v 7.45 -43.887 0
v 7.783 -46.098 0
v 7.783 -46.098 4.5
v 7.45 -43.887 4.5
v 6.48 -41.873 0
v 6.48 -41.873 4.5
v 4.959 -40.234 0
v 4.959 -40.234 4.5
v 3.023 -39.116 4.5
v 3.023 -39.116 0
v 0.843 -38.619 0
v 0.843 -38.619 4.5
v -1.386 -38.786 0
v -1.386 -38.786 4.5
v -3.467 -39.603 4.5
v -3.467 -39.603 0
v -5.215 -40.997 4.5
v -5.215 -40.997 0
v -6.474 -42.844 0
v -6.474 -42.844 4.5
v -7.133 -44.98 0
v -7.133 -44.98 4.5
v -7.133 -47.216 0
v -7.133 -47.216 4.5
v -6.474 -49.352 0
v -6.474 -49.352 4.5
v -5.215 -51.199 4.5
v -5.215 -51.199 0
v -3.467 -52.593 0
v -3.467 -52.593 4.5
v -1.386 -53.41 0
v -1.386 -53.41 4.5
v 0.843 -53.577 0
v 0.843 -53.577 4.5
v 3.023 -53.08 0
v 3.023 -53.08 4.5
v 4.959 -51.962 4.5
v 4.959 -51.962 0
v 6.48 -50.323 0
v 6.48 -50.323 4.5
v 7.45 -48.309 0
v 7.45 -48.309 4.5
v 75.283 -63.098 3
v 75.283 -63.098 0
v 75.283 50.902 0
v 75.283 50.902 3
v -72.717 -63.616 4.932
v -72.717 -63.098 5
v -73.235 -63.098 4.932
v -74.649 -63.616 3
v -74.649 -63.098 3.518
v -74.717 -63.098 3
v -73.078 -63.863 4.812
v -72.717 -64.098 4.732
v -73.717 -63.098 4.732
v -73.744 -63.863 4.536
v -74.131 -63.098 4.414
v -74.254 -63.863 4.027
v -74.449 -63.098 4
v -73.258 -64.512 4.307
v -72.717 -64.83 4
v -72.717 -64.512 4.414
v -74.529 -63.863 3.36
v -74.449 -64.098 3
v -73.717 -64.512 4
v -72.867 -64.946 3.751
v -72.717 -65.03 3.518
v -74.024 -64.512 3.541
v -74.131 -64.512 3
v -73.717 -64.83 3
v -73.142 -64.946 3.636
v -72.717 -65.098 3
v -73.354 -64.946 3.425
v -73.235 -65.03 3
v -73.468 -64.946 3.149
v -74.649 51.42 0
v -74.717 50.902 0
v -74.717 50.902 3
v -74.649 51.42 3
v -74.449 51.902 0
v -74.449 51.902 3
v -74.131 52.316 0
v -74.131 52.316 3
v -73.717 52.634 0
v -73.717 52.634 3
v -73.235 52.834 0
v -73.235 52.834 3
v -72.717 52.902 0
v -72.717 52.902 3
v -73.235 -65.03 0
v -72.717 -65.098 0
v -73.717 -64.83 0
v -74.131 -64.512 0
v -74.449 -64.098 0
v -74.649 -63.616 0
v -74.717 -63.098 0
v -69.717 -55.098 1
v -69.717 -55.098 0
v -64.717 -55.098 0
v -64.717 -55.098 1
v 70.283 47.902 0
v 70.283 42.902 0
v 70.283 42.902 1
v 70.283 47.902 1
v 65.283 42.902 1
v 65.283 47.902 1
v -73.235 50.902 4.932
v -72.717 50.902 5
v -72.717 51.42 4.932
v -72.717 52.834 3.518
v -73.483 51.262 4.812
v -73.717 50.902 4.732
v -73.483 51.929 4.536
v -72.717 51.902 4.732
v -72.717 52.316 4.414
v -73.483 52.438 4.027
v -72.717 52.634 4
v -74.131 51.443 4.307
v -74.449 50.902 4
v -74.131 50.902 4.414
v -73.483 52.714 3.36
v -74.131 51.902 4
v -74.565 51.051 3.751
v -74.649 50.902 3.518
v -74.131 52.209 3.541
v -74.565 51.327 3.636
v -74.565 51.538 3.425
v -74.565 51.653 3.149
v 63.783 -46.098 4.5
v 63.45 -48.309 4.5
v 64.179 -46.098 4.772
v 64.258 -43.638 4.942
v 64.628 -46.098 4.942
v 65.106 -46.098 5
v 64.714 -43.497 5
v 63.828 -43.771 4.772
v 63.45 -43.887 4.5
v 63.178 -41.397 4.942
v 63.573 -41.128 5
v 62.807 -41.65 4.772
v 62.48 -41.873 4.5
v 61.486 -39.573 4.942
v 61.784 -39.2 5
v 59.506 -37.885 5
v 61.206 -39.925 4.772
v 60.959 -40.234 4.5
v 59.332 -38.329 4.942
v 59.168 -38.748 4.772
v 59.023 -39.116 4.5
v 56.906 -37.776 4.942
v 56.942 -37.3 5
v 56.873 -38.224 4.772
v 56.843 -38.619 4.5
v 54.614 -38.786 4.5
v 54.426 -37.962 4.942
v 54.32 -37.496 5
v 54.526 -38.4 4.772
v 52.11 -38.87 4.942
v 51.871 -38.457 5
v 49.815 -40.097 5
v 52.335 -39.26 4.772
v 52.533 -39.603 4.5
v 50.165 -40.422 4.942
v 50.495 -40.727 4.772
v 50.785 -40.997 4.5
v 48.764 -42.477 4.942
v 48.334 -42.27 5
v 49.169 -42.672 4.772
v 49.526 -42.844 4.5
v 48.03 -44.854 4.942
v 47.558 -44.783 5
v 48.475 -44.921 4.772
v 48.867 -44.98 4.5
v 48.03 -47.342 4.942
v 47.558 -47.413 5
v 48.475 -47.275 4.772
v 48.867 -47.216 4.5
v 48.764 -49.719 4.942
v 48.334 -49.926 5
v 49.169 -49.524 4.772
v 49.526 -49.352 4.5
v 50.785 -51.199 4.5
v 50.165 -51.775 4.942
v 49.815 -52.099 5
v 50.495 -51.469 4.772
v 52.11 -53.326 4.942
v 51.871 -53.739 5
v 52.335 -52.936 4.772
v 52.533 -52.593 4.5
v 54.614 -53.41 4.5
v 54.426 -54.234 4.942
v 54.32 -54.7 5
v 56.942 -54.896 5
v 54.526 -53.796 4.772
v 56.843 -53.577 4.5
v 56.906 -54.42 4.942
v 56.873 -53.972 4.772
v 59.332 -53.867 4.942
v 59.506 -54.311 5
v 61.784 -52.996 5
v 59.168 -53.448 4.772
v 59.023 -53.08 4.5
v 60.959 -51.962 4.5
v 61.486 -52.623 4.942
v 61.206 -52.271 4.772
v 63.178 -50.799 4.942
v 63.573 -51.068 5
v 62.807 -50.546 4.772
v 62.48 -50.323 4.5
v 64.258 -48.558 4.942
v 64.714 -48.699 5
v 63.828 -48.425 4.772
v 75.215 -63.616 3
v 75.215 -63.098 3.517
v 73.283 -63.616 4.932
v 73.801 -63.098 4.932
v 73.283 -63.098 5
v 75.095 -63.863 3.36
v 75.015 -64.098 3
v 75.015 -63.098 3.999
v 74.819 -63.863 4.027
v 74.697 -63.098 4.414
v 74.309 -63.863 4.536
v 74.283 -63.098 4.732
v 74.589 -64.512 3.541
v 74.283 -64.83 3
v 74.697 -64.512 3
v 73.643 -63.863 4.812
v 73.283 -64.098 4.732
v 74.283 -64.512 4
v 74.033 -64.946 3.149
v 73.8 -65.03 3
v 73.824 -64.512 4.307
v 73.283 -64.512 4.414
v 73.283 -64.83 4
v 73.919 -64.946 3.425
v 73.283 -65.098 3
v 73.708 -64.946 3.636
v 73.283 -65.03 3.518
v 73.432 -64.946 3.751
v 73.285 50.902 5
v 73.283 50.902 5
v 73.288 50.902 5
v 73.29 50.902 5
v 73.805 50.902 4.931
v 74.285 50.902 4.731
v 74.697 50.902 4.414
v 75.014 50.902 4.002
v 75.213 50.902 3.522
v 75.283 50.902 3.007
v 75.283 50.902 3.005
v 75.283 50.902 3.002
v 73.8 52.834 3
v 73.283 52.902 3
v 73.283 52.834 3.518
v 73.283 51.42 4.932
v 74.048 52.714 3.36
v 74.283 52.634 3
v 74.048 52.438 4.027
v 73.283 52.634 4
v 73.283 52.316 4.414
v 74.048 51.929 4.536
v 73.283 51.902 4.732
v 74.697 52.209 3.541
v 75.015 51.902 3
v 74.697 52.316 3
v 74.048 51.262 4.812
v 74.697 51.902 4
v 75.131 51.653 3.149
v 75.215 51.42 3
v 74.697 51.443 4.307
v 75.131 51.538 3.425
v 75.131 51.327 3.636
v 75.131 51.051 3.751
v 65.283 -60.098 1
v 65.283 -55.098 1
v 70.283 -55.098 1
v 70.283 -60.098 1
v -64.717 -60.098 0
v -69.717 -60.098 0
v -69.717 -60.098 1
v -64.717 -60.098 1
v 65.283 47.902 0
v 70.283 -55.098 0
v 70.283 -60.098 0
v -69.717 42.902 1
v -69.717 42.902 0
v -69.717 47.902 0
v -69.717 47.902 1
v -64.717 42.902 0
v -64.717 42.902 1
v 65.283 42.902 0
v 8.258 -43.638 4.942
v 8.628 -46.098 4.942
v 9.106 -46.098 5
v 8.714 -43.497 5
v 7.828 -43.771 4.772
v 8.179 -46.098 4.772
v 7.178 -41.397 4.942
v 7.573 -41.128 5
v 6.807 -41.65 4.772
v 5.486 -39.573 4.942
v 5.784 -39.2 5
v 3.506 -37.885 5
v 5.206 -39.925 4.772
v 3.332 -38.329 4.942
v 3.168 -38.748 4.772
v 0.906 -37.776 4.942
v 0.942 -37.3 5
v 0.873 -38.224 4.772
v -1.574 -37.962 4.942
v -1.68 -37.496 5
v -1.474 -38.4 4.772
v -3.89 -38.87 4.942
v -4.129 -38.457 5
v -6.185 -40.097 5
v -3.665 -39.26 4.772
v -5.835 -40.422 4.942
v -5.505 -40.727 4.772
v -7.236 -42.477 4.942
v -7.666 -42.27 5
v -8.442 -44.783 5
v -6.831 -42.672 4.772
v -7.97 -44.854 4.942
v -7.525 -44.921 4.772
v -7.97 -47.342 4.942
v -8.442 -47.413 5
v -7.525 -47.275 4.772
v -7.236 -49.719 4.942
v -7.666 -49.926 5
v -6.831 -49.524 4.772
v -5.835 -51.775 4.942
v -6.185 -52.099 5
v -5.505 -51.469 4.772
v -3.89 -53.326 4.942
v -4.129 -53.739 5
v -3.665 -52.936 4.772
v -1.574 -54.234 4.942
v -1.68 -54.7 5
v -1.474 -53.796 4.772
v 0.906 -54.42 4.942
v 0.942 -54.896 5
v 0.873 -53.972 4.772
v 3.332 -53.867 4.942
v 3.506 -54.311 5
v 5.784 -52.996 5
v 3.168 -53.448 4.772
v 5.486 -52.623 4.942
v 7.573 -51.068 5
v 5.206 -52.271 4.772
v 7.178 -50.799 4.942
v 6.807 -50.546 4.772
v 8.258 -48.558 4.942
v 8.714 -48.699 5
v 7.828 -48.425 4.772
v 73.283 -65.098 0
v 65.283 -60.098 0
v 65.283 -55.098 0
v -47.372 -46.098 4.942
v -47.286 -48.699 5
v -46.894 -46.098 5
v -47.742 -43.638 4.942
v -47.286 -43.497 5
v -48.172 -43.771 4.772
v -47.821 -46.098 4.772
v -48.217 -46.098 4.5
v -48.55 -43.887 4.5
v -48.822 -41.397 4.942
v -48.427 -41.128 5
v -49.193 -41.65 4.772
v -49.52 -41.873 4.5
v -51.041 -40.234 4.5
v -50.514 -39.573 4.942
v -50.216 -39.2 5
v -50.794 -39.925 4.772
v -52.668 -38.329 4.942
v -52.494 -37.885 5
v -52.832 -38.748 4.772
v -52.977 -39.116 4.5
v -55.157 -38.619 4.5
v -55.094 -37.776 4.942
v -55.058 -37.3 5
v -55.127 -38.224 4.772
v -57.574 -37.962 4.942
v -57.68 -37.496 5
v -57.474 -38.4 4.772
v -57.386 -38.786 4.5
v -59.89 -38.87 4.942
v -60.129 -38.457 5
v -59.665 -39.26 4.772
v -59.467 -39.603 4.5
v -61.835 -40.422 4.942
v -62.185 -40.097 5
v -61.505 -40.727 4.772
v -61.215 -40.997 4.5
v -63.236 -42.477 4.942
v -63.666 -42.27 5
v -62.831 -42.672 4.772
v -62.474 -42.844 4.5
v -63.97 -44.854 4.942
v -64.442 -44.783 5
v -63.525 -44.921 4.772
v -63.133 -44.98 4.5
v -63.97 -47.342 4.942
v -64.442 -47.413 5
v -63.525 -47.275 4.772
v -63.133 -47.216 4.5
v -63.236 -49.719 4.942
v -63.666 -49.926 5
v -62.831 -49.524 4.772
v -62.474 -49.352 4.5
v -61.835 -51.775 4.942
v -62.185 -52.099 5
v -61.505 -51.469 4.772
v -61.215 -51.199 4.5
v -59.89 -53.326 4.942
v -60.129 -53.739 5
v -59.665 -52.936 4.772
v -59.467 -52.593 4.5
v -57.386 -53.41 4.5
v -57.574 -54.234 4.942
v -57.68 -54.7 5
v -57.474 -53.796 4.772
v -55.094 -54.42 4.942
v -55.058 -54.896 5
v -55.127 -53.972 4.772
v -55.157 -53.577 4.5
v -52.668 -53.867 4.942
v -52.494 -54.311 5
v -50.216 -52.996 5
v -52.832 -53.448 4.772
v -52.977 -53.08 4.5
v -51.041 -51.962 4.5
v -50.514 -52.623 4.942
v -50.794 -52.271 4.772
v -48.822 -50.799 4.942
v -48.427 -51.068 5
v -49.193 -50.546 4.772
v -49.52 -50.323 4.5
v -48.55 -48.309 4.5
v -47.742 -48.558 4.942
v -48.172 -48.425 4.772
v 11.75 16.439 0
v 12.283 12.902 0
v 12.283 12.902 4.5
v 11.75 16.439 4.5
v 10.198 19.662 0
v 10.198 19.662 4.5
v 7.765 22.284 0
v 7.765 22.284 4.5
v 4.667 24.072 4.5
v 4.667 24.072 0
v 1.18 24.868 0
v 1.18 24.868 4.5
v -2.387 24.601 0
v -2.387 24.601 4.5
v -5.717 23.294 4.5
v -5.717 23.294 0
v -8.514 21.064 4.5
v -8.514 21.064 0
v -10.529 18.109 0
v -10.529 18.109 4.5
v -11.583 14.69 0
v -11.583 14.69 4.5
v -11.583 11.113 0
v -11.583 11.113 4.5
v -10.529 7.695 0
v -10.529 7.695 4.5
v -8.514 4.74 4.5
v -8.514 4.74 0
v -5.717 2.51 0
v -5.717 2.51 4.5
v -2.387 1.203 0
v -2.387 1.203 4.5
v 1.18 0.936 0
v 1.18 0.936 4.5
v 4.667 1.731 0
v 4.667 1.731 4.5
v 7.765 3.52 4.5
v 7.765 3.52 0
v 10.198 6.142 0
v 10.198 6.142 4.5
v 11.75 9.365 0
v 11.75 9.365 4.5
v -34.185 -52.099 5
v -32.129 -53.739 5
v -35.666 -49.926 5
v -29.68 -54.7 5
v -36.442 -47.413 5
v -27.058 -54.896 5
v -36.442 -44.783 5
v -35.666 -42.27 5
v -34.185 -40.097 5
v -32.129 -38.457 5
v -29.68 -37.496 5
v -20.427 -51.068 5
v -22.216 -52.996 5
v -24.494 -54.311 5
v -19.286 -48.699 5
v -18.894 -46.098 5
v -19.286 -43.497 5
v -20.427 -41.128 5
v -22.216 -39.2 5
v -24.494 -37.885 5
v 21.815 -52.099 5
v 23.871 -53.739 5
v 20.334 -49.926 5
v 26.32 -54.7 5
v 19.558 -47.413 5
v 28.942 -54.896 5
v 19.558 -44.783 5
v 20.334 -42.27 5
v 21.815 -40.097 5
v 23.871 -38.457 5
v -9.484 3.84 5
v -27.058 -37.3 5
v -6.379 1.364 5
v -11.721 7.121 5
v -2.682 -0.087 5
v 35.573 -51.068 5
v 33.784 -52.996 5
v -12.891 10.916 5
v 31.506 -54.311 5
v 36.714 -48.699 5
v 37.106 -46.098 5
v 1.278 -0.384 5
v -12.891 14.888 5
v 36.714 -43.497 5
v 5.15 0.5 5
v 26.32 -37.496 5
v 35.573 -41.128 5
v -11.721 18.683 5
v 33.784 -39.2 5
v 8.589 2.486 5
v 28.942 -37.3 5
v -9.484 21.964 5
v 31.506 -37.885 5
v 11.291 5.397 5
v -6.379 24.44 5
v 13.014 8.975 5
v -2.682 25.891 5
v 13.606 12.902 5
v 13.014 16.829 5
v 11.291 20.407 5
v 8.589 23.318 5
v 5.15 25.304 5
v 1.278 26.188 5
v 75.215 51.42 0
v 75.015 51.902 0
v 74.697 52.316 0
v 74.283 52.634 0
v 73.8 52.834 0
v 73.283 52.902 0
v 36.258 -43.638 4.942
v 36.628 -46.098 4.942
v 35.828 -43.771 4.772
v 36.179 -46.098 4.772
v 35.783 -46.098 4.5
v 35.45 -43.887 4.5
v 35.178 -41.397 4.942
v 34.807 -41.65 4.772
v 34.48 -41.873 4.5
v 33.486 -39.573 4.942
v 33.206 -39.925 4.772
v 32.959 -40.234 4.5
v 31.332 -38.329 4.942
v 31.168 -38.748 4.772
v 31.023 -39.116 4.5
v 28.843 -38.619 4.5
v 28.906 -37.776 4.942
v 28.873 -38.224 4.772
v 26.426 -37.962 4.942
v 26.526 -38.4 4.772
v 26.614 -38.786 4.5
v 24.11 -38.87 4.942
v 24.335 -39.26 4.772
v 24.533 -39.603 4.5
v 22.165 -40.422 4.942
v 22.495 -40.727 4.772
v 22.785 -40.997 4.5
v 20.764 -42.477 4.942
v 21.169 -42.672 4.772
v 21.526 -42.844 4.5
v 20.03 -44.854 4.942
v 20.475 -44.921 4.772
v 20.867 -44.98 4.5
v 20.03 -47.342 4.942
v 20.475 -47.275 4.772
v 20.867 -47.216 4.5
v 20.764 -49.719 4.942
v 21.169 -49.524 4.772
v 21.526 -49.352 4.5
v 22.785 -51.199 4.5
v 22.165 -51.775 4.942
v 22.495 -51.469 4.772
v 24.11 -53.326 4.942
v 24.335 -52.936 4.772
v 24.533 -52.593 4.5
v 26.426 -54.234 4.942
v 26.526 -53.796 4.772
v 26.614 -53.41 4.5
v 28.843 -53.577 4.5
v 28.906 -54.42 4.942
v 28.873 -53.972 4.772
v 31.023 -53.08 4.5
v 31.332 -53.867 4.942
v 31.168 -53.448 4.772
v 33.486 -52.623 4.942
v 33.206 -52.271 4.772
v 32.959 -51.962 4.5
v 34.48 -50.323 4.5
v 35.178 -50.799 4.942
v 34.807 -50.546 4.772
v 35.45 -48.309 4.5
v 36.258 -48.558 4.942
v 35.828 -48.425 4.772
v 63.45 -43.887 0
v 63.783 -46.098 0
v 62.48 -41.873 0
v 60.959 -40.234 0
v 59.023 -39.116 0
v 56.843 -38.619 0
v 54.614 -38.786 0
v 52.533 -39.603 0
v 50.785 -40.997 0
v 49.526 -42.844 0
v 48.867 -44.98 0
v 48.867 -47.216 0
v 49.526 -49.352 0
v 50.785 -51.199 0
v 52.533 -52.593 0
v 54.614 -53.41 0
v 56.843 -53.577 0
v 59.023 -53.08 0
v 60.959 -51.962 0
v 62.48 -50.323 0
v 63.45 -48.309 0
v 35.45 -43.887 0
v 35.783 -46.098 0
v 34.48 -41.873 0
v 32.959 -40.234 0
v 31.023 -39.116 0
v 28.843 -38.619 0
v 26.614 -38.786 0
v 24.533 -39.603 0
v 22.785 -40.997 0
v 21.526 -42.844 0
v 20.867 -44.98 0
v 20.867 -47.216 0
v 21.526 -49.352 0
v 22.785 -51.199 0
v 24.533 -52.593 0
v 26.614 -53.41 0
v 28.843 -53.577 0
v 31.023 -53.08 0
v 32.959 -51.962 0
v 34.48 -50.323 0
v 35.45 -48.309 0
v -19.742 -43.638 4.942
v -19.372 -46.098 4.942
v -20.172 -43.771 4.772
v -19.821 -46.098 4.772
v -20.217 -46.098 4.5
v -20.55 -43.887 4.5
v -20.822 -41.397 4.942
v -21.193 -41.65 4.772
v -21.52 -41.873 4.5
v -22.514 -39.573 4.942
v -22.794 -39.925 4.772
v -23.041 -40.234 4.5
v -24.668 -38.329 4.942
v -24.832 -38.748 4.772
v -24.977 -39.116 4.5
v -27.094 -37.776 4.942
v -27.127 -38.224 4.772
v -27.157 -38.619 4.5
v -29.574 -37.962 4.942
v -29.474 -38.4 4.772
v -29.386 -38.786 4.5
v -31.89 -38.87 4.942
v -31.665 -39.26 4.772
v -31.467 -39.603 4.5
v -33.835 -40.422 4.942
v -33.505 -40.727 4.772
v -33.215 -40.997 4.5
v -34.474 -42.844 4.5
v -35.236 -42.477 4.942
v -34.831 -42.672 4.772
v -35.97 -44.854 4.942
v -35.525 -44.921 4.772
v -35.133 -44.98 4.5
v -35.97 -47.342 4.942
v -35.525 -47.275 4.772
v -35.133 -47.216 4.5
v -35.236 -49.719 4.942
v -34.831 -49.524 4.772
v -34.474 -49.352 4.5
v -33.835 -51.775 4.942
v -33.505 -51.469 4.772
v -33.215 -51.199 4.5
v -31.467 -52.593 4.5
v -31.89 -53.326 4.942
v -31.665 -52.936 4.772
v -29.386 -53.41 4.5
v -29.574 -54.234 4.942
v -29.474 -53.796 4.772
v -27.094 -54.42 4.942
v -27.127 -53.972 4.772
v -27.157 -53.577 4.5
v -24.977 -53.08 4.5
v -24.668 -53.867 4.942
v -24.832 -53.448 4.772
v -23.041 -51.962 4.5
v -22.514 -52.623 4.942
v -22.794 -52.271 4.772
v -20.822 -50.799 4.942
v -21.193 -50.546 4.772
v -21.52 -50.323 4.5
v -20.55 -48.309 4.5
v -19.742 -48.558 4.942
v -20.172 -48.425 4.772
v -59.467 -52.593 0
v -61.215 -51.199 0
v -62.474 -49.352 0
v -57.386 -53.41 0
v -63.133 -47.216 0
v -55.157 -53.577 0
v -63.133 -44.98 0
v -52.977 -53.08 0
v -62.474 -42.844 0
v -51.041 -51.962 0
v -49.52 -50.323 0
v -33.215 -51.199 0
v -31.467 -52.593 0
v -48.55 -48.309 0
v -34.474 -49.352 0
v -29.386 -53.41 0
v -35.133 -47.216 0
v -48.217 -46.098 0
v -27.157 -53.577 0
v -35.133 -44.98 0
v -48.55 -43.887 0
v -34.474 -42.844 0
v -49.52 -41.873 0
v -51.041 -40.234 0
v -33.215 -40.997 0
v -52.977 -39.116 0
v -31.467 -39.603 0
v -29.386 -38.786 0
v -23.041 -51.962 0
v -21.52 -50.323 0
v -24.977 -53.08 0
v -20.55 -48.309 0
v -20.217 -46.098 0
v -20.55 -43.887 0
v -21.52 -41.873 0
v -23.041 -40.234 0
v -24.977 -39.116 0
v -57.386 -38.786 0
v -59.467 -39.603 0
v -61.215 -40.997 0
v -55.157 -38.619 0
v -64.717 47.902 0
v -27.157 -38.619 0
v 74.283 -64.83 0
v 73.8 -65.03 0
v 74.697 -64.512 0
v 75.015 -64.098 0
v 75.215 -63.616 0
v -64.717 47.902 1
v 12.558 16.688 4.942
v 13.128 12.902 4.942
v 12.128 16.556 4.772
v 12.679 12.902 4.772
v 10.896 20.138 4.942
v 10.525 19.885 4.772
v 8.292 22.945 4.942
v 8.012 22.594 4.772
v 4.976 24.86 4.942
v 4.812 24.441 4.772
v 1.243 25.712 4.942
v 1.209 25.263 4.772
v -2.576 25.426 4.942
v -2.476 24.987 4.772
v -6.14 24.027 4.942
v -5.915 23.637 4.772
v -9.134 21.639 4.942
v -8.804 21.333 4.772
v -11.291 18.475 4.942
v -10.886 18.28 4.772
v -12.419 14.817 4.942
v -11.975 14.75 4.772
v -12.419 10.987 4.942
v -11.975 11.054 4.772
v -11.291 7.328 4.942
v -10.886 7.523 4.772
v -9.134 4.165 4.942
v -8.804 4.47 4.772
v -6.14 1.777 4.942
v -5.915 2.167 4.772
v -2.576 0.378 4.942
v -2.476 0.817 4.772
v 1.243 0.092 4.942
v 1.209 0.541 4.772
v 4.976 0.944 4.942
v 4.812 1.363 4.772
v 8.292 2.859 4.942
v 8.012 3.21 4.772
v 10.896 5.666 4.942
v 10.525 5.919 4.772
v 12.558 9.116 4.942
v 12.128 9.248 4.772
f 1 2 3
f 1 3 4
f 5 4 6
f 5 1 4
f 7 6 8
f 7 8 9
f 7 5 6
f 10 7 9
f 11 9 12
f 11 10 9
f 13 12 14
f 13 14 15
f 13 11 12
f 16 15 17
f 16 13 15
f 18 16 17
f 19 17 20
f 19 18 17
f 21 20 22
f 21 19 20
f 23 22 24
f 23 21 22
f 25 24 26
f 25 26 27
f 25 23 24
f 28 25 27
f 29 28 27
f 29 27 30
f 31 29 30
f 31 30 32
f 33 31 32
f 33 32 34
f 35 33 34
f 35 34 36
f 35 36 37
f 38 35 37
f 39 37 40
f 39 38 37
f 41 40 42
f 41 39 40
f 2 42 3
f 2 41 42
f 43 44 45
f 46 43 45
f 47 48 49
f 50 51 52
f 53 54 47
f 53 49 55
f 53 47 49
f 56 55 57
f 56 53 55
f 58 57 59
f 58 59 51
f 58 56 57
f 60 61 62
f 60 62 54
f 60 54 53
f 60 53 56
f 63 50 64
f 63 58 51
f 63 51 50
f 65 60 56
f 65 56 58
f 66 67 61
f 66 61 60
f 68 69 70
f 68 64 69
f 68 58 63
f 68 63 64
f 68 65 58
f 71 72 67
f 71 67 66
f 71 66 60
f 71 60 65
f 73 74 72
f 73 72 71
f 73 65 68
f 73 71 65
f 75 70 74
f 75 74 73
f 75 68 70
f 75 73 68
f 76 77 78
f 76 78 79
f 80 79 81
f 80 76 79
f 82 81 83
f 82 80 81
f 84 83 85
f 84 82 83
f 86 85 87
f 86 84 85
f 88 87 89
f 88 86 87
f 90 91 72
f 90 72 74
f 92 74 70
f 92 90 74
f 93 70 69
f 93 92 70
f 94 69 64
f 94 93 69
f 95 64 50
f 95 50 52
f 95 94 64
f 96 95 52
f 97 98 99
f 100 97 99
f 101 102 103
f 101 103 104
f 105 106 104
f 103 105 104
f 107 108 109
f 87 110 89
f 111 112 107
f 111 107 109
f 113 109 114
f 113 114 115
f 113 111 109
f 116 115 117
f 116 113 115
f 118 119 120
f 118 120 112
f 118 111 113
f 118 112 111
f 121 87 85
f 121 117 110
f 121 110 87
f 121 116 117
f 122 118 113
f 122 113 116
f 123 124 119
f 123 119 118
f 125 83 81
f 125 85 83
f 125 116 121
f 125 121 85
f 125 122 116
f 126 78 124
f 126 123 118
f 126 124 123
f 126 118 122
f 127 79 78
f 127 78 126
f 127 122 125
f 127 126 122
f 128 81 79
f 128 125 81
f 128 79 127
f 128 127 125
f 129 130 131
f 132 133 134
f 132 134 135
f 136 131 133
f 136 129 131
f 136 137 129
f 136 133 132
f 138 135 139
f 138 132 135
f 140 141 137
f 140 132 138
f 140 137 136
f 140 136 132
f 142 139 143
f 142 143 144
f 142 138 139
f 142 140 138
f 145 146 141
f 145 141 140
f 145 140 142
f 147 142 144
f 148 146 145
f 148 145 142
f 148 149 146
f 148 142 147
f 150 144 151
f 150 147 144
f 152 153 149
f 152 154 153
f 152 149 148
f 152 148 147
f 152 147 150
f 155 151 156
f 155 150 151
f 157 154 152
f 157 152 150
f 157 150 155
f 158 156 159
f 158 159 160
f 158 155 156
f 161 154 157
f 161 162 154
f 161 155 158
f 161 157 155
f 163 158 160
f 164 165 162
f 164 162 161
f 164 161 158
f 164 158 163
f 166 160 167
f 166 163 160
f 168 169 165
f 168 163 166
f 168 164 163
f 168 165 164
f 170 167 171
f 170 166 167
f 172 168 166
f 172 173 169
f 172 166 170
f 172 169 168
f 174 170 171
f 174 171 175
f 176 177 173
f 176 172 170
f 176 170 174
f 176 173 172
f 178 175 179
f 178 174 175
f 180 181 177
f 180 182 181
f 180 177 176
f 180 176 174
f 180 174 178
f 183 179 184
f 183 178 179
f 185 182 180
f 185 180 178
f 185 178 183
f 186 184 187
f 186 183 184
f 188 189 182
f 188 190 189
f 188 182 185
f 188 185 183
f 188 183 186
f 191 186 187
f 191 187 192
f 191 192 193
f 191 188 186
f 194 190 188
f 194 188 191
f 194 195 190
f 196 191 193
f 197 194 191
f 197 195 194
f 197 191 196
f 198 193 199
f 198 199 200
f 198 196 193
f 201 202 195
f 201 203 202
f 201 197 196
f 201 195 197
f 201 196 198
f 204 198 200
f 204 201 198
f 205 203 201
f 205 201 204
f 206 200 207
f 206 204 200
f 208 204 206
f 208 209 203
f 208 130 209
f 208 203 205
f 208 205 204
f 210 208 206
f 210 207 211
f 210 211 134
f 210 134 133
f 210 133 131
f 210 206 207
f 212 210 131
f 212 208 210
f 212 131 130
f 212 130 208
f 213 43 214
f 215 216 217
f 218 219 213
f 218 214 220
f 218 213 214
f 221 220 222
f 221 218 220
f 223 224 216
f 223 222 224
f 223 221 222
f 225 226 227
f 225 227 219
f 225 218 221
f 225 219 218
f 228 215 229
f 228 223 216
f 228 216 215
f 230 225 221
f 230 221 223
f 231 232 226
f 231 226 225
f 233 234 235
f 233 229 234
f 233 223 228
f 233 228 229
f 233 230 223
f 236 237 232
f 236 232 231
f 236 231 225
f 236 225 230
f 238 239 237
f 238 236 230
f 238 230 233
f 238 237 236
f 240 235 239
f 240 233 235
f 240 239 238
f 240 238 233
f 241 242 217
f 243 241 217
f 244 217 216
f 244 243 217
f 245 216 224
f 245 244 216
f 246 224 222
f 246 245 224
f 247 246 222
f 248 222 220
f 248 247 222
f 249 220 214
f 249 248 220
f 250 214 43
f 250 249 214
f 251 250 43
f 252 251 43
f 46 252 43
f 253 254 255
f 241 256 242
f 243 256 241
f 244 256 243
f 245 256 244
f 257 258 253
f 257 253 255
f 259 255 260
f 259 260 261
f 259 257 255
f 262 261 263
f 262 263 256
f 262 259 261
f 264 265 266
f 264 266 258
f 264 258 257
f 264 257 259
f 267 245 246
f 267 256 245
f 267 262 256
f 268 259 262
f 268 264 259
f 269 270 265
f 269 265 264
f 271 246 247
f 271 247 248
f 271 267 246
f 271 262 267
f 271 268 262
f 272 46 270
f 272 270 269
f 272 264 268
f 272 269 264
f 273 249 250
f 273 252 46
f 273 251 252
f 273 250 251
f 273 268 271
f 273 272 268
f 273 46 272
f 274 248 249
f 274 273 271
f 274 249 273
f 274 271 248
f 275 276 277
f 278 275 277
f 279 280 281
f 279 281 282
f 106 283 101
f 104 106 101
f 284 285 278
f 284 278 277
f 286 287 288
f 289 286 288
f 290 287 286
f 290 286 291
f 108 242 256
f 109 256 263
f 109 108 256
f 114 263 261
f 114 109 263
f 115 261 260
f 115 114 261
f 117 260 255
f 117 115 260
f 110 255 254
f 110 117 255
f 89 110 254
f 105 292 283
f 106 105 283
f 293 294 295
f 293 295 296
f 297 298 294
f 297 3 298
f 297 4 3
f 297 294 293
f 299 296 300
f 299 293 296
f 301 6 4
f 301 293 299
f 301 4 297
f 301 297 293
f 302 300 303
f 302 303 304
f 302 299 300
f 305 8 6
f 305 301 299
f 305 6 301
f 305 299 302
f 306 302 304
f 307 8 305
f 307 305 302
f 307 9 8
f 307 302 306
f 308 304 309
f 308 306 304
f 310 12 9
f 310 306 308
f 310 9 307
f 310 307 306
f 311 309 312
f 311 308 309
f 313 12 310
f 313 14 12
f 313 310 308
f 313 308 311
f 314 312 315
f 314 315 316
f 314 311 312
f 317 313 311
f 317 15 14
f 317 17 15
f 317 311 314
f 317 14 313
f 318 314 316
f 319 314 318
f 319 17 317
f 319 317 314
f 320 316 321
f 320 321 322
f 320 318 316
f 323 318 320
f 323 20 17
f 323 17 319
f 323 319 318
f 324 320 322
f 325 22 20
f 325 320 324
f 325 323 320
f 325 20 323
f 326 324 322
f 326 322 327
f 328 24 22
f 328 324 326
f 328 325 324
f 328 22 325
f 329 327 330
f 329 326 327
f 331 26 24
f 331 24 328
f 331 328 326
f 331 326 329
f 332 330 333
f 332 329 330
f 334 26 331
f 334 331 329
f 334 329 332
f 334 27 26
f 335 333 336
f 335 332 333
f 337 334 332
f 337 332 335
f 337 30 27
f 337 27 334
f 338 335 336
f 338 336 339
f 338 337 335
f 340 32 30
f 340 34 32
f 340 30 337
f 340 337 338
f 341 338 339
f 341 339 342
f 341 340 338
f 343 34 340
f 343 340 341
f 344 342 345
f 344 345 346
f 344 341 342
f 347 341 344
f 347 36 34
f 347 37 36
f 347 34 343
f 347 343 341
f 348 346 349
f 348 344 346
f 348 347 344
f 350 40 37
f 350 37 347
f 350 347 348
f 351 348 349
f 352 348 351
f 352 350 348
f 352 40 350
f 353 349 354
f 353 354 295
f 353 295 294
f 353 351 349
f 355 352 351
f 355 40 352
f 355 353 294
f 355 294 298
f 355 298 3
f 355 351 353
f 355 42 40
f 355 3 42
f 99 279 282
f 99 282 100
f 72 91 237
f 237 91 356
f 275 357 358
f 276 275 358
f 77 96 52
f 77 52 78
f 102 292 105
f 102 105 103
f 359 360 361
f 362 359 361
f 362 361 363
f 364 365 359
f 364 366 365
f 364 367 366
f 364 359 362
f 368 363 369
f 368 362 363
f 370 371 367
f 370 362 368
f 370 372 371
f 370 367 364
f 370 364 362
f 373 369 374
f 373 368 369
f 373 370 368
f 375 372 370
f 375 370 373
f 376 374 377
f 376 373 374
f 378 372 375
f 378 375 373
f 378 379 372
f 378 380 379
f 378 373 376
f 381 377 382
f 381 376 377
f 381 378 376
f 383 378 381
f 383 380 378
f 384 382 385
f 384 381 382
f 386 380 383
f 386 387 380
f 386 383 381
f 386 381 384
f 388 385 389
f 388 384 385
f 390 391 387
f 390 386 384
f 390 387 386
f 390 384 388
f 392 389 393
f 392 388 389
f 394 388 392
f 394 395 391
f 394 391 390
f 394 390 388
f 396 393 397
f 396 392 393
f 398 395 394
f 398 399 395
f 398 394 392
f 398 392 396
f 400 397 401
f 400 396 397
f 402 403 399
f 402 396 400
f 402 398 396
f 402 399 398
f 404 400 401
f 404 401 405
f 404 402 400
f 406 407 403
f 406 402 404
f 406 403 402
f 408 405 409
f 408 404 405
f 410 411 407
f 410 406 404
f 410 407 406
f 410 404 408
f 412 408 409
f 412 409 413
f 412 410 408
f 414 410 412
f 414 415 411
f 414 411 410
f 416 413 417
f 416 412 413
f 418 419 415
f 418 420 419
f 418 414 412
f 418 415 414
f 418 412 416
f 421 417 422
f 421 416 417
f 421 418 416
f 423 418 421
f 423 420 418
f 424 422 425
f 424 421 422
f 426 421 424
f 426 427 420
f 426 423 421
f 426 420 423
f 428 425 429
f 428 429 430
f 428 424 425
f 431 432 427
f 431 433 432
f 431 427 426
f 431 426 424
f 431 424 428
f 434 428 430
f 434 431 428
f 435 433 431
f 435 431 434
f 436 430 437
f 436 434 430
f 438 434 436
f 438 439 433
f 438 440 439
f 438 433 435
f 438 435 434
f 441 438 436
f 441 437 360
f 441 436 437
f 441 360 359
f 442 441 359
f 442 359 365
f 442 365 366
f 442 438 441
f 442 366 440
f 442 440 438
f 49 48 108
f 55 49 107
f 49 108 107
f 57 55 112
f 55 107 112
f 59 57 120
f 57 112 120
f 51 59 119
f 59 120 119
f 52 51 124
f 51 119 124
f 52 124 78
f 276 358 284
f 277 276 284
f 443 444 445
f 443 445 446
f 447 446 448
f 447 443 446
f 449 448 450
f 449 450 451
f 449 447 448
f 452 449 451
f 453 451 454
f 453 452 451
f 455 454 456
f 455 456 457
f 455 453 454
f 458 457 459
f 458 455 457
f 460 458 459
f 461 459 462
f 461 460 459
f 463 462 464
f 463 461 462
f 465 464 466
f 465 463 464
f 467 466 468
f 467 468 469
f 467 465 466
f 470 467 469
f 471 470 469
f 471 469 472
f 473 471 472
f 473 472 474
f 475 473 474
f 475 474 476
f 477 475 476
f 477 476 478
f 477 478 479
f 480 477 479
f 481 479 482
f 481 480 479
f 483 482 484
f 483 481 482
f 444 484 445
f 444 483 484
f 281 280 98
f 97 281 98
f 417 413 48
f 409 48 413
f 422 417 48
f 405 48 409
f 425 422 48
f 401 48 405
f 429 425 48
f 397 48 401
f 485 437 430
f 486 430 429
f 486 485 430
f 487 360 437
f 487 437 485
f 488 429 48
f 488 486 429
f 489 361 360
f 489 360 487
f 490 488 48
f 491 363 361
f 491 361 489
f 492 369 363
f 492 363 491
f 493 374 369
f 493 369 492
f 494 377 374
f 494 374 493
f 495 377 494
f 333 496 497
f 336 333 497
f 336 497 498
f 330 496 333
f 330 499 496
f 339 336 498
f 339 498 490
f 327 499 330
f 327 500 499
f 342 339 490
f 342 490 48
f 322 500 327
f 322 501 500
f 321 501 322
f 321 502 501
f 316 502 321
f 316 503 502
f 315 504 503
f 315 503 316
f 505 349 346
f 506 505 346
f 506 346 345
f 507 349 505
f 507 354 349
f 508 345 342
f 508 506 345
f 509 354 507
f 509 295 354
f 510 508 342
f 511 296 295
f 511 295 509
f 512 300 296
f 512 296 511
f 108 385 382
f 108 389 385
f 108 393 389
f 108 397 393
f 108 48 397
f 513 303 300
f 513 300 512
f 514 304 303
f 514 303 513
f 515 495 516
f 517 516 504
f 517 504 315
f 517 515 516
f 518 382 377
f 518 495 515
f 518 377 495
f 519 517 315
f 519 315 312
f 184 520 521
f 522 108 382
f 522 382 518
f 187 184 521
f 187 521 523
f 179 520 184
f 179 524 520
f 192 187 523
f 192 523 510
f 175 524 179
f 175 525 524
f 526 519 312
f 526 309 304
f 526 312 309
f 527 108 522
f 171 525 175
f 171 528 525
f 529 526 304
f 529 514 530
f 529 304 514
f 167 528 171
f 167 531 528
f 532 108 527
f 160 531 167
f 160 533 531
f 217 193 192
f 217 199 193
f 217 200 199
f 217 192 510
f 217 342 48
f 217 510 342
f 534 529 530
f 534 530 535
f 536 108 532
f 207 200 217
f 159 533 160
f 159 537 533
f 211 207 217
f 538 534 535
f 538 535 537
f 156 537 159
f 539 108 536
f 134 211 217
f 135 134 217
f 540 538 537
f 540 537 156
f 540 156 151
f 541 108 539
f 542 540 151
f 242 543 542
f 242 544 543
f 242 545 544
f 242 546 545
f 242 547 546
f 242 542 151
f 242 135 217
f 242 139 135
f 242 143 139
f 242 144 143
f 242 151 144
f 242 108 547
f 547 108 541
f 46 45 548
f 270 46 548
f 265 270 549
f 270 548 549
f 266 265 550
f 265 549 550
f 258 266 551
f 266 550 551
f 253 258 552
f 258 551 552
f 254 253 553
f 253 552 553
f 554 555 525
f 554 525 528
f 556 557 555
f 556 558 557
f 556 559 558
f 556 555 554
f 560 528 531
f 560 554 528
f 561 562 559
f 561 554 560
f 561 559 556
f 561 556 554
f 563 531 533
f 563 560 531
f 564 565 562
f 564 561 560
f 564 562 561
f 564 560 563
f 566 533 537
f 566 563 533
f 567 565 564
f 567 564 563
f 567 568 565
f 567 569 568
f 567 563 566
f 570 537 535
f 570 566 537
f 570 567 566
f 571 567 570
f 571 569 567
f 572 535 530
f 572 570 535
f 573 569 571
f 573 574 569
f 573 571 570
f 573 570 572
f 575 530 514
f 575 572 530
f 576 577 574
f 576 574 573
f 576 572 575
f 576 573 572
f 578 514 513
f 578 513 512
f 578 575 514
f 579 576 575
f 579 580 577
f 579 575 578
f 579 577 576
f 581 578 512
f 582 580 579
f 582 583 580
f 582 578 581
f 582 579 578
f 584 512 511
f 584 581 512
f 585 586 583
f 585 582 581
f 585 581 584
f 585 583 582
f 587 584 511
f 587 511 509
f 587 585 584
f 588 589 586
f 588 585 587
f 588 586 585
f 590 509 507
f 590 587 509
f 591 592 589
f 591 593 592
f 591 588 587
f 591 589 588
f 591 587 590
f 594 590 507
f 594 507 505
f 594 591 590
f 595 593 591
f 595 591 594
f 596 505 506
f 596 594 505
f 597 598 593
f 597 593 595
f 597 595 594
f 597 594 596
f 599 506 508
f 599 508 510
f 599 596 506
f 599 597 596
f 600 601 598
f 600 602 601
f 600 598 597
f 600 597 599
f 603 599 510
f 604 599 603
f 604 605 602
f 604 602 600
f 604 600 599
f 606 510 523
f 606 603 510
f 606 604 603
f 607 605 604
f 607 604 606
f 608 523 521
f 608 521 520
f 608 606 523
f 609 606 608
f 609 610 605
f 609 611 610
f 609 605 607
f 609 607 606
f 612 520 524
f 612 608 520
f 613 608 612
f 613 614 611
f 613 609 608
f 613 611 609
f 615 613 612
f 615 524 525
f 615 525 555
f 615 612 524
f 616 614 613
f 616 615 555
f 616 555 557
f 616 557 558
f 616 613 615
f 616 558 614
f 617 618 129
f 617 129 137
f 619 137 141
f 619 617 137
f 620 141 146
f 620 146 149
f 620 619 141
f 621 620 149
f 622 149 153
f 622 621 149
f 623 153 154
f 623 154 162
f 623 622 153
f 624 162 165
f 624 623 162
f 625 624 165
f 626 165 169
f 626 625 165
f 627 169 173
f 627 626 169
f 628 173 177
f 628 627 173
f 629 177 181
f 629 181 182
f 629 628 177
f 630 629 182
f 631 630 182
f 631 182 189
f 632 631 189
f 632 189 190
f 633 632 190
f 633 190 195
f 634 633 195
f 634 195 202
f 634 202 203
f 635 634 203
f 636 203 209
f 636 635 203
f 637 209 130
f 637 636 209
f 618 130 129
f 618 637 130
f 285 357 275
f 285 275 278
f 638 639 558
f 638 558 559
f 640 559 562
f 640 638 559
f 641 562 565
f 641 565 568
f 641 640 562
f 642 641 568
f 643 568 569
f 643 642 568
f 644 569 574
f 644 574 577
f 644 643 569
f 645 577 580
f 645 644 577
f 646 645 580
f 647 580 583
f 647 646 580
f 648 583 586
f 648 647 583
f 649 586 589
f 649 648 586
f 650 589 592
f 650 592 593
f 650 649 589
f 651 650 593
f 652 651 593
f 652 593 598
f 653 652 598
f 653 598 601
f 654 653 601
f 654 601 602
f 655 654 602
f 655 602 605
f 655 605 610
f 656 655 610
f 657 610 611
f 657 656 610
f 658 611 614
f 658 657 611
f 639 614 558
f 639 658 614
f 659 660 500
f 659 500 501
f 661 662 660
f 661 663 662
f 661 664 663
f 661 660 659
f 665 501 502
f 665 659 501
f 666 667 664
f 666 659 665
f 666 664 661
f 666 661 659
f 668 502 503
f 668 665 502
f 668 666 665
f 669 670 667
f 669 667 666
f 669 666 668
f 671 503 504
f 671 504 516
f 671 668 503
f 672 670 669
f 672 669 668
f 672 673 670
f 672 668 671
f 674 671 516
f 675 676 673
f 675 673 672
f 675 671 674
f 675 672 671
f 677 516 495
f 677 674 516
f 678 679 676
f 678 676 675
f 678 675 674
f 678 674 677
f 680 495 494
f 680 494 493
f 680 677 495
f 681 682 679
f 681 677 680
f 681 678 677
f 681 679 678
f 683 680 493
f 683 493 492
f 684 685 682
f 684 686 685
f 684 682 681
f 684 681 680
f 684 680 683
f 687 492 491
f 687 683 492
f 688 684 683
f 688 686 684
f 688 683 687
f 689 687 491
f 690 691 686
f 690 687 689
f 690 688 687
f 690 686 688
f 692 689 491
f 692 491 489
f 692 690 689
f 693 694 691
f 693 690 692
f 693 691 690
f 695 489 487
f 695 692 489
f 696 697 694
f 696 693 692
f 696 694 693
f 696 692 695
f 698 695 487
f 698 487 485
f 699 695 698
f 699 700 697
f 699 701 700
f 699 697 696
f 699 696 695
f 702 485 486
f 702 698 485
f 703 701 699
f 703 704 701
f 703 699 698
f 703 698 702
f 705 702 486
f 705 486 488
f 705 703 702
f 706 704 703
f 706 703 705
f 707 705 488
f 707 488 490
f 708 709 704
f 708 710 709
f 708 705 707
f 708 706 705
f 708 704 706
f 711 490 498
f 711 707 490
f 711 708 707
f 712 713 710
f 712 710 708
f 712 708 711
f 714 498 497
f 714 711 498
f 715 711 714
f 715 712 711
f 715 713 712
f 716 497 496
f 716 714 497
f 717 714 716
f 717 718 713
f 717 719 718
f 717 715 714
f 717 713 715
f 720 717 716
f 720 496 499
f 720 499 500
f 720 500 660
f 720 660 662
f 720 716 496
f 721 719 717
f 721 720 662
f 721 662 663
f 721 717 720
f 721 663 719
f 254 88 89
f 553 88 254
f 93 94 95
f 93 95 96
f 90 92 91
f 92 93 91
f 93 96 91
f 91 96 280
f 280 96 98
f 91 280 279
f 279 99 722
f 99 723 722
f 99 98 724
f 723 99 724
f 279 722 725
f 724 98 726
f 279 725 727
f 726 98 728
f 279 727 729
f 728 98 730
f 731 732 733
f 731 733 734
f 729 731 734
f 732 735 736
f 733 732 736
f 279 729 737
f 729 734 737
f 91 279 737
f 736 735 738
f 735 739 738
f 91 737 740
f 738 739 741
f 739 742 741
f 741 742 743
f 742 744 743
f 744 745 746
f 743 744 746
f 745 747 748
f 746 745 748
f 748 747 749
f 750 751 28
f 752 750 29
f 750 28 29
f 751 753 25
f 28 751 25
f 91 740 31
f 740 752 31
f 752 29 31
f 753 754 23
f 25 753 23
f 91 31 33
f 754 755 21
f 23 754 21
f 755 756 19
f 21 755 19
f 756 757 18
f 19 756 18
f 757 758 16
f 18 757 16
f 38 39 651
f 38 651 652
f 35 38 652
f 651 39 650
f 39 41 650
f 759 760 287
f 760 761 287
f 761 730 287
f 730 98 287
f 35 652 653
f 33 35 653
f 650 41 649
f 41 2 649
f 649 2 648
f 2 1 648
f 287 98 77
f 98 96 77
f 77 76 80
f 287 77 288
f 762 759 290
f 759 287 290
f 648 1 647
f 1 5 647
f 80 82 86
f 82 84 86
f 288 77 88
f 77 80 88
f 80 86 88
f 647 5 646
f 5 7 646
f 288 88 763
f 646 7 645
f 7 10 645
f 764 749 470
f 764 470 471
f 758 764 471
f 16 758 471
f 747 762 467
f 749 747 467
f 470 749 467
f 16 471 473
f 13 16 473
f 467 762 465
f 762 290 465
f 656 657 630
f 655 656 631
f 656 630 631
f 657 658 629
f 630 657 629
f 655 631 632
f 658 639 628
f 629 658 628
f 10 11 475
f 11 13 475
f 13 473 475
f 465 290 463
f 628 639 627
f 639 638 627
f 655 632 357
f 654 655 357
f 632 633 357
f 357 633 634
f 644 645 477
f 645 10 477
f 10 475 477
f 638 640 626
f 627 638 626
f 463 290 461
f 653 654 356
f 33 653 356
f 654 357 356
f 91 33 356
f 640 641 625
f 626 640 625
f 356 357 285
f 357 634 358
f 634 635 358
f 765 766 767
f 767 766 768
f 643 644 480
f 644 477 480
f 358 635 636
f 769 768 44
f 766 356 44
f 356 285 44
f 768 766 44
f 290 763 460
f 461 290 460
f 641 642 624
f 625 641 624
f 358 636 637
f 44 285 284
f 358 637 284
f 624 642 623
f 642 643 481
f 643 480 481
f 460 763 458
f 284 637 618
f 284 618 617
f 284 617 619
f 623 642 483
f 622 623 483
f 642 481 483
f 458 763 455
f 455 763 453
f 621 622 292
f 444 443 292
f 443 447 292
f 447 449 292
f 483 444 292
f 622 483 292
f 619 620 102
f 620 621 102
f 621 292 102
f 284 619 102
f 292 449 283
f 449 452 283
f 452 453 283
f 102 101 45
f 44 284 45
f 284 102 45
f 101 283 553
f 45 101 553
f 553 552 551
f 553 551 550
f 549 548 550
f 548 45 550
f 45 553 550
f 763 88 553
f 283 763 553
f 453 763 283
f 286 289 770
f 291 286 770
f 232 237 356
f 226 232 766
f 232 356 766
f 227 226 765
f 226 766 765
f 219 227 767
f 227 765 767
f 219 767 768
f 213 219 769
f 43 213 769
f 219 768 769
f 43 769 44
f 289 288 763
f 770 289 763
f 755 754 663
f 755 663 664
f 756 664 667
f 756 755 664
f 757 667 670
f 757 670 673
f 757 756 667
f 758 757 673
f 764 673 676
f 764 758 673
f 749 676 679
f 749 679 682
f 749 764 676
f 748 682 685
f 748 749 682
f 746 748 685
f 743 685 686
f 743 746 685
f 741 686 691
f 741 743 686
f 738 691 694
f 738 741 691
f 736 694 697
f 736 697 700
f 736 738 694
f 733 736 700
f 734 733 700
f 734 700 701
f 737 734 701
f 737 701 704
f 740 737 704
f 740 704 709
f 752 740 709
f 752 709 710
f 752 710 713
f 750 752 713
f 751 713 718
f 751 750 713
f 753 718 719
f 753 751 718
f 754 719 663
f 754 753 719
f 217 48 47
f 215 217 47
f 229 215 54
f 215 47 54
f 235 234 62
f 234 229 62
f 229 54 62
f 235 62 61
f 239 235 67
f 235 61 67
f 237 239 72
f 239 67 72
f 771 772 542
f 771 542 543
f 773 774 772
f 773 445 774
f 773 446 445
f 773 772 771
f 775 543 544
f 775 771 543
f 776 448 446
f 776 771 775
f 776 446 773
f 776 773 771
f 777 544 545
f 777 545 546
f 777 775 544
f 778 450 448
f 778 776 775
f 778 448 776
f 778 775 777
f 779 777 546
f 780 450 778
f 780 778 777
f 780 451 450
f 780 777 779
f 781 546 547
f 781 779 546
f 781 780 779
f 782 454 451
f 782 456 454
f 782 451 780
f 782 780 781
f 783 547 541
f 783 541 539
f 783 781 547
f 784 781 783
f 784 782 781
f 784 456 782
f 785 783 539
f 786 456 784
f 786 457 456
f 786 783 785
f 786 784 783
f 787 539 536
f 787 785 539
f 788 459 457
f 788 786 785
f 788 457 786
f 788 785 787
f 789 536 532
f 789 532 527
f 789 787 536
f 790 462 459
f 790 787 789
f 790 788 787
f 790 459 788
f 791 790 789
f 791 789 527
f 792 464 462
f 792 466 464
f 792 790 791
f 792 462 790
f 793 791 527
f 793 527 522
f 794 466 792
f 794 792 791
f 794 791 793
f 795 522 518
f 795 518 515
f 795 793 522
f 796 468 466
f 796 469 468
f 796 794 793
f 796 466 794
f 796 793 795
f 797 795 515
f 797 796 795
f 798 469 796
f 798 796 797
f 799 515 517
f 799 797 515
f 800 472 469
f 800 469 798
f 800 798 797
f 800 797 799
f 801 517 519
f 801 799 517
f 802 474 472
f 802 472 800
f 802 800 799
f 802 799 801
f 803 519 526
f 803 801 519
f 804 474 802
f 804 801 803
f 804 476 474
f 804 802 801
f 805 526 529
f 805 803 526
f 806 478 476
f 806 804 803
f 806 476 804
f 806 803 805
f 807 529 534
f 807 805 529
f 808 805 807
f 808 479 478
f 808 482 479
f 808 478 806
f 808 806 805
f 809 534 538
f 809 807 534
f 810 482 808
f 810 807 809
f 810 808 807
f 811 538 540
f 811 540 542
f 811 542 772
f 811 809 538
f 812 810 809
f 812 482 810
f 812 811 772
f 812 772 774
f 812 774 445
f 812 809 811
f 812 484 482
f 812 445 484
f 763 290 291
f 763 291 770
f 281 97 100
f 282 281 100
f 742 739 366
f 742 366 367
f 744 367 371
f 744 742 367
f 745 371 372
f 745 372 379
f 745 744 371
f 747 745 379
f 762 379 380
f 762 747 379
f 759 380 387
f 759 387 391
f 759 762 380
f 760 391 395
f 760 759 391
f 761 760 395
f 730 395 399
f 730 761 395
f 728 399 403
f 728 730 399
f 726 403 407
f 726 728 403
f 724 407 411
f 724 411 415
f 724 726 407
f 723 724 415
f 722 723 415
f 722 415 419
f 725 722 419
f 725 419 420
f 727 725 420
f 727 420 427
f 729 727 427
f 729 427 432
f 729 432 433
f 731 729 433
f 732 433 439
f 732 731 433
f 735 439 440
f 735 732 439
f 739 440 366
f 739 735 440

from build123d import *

# Parameters (mm, degrees)
F0_W         = 150
F0_H         = 118
F0_W_2       = 5
F0_H_2       = 5
F0_R         = 7.5
F0_R_2       = 12
F1_DEPTH     = 5
F2_DEPTH     = 1
F3_SIZE      = 0.5
F4_T1_DEPTH  = 160
F4_T3_DEPTH  = 128
F5_T1_DEPTH  = 8
F5_S5_W      = 2
F5_S5_H      = 2
F5_T6_DEPTH  = 2
F5_S11_W     = 2
F5_S11_H     = 2
F5_T12_DEPTH = 2
F5_S17_W     = 2
F5_S17_H     = 2
F5_T18_DEPTH = 2
F5_S23_W     = 2
F5_S23_H     = 2
F5_T24_DEPTH = 2


# Not quite as in the source:
# - a fillet or chamfer that OpenCascade refuses, or shapes differently, is made with other operations: its cross-section is extruded or revolved along the edge and cut away or added


with BuildPart() as f1:
    # F0 (on Top) → F1 (new body)
    with BuildSketch(Plane.XY):
        with Locations((0.2827864019, -6.098040469)):
            Rectangle(F0_W, F0_H)
        with Locations((-67.2172135981, -57.598040469)):
            Rectangle(F0_W_2, F0_H_2, mode=Mode.SUBTRACT)
        with Locations((-55.7172135981, -46.098040469)):
            Circle(F0_R, mode=Mode.SUBTRACT)
        with Locations((-27.7172135981, -46.098040469)):
            Circle(F0_R, mode=Mode.SUBTRACT)
        with Locations((0.2827864019, -46.098040469)):
            Circle(F0_R, mode=Mode.SUBTRACT)
        with Locations((28.2827864019, -46.098040469)):
            Circle(F0_R, mode=Mode.SUBTRACT)
        with Locations((67.7827864019, -57.598040469)):
            Rectangle(F0_W_2, F0_H_2, mode=Mode.SUBTRACT)
        with Locations((56.2827864019, -46.098040469)):
            Circle(F0_R, mode=Mode.SUBTRACT)
        with Locations((-67.2172135981, 45.401959531)):
            Rectangle(F0_W_2, F0_H_2, mode=Mode.SUBTRACT)
        with Locations((0.2827864019, 12.901959531)):
            Circle(F0_R_2, mode=Mode.SUBTRACT)
        with Locations((67.7827864019, 45.401959531)):
            Rectangle(F0_W_2, F0_H_2, mode=Mode.SUBTRACT)
        with Locations((-67.2172135981, -57.598040469)):
            Rectangle(F0_W_2, F0_H_2)
        with Locations((-67.2172135981, 45.401959531)):
            Rectangle(F0_W_2, F0_H_2)
        with Locations((67.7827864019, 45.401959531)):
            Rectangle(F0_W_2, F0_H_2)
        with Locations((67.7827864019, -57.598040469)):
            Rectangle(F0_W_2, F0_H_2)
    extrude(amount=F1_DEPTH)

    # F0 (on Top) → F2 (cut)
    with BuildSketch(Plane.XY):
        with Locations((-67.2172135981, 45.401959531)):
            Rectangle(F0_W_2, F0_H_2)
        with Locations((67.7827864019, 45.401959531)):
            Rectangle(F0_W_2, F0_H_2)
        with Locations((67.7827864019, -57.598040469)):
            Rectangle(F0_W_2, F0_H_2)
        with Locations((-67.2172135981, -57.598040469)):
            Rectangle(F0_W_2, F0_H_2)
    extrude(amount=F2_DEPTH, mode=Mode.SUBTRACT)

    # F3
    f3_edges = [f1.edges().sort_by_distance(p)[0] for p in [
        (-11.717214, 12.90196, 5),
        (-63.217214, -46.09804, 5),
        (-35.217214, -46.09804, 5),
        (-7.217214, -46.09804, 5),
        (20.782786, -46.09804, 5),
        (48.782786, -46.09804, 5),
    ]]
    chamfer(f3_edges, length=F3_SIZE)

    # F4: fillet of radius 2 on 10 edges, made by hand

    # F4_s2 → F4_t1 (cut)
    with BuildSketch(Plane.YZ.offset(-79.7172135981)):
        with BuildLine():
            ThreePointArc((50.901959531, 5), (52.3161730933, 4.4142135624), (52.901959531, 3))
            Line((52.901959531, 3), (52.901959531, 5))
            Line((52.901959531, 5), (50.901959531, 5))
        make_face()
        with BuildLine():
            ThreePointArc((-63.098040469, 5), (-64.5122540314, 4.4142135624), (-65.098040469, 3))
            Line((-65.098040469, 3), (-65.098040469, 5))
            Line((-65.098040469, 5), (-63.098040469, 5))
        make_face()
    extrude(amount=F4_T1_DEPTH, mode=Mode.SUBTRACT)

    # F4_s4 → F4_t3 (cut)
    with BuildSketch(Plane.XZ.offset(-57.901959531)):
        with BuildLine():
            ThreePointArc((-72.7172135981, 5), (-74.1314271605, 4.4142135624), (-74.7172135981, 3))
            Line((-74.7172135981, 3), (-74.7172135981, 5))
            Line((-74.7172135981, 5), (-72.7172135981, 5))
        make_face()
        with BuildLine():
            ThreePointArc((73.2827864019, 5), (74.6969999642, 4.4142135624), (75.2827864019, 3))
            Line((75.2827864019, 3), (75.2827864019, 5))
            Line((75.2827864019, 5), (73.2827864019, 5))
        make_face()
    extrude(amount=F4_T3_DEPTH, mode=Mode.SUBTRACT)

    # F4_s5 → F4_t6 (revolve, cut)
    with BuildSketch(Plane.XZ.offset(-12.901959531)):
        with BuildLine():
            ThreePointArc((13.6056620574, 5), (12.8985552762, 4.8708286934), (12.2827864019, 4.5))
            Line((12.2827864019, 4.5), (12.7827864019, 5))
            Line((12.7827864019, 5), (13.6056620574, 5))
        make_face()
    revolve(axis=Axis((0.2827864019, 12.901959531, 5), (0, 0, 1)), mode=Mode.SUBTRACT)

    # F4_s7 → F4_t8 (revolve, cut)
    with BuildSketch(Plane.XZ.offset(46.098040469)):
        with BuildLine():
            ThreePointArc((-46.8943379426, 5), (-47.6014447238, 4.8708286934), (-48.2172135981, 4.5))
            Line((-48.2172135981, 4.5), (-47.7172135981, 5))
            Line((-47.7172135981, 5), (-46.8943379426, 5))
        make_face()
    revolve(axis=Axis((-55.7172135981, -46.098040469, 5), (0, 0, 1)), mode=Mode.SUBTRACT)

    # F4_s9 → F4_t10 (revolve, cut)
    with BuildSketch(Plane.XZ.offset(46.098040469)):
        with BuildLine():
            ThreePointArc((-18.8943379426, 5), (-19.6014447238, 4.8708286934), (-20.2172135981, 4.5))
            Line((-20.2172135981, 4.5), (-19.7172135981, 5))
            Line((-19.7172135981, 5), (-18.8943379426, 5))
        make_face()
    revolve(axis=Axis((-27.7172135981, -46.098040469, 5), (0, 0, 1)), mode=Mode.SUBTRACT)

    # F4_s11 → F4_t12 (revolve, cut)
    with BuildSketch(Plane.XZ.offset(46.098040469)):
        with BuildLine():
            ThreePointArc((9.1056620574, 5), (8.3985552762, 4.8708286934), (7.7827864019, 4.5))
            Line((7.7827864019, 4.5), (8.2827864019, 5))
            Line((8.2827864019, 5), (9.1056620574, 5))
        make_face()
    revolve(axis=Axis((0.2827864019, -46.098040469, 5), (0, 0, 1)), mode=Mode.SUBTRACT)

    # F4_s13 → F4_t14 (revolve, cut)
    with BuildSketch(Plane.XZ.offset(46.098040469)):
        with BuildLine():
            ThreePointArc((37.1056620574, 5), (36.3985552762, 4.8708286934), (35.7827864019, 4.5))
            Line((35.7827864019, 4.5), (36.2827864019, 5))
            Line((36.2827864019, 5), (37.1056620574, 5))
        make_face()
    revolve(axis=Axis((28.2827864019, -46.098040469, 5), (0, 0, 1)), mode=Mode.SUBTRACT)

    # F4_s15 → F4_t16 (revolve, cut)
    with BuildSketch(Plane.XZ.offset(46.098040469)):
        with BuildLine():
            ThreePointArc((65.1056620574, 5), (64.3985552762, 4.8708286934), (63.7827864019, 4.5))
            Line((63.7827864019, 4.5), (64.2827864019, 5))
            Line((64.2827864019, 5), (65.1056620574, 5))
        make_face()
    revolve(axis=Axis((56.2827864019, -46.098040469, 5), (0, 0, 1)), mode=Mode.SUBTRACT)

    # F5: fillet of radius 2 on 14 edges, made by hand

    # F5_s2 → F5_t1 (cut)
    with BuildSketch(Plane.XY.offset(-5)):
        with BuildLine():
            ThreePointArc((73.2827864019, -65.098040469), (74.6969999642, -64.5122540314), (75.2827864019, -63.098040469))
            Line((75.2827864019, -63.098040469), (75.2827864019, -65.098040469))
            Line((75.2827864019, -65.098040469), (73.2827864019, -65.098040469))
        make_face()
        with BuildLine():
            ThreePointArc((-72.7172135981, -65.098040469), (-74.1314271605, -64.5122540314), (-74.7172135981, -63.098040469))
            Line((-74.7172135981, -63.098040469), (-74.7172135981, -65.098040469))
            Line((-74.7172135981, -65.098040469), (-72.7172135981, -65.098040469))
        make_face()
        with BuildLine():
            ThreePointArc((-74.7172135981, 50.901959531), (-74.1314271605, 52.3161730933), (-72.7172135981, 52.901959531))
            Line((-72.7172135981, 52.901959531), (-74.7172135981, 52.901959531))
            Line((-74.7172135981, 52.901959531), (-74.7172135981, 50.901959531))
        make_face()
        with BuildLine():
            ThreePointArc((75.2827864019, 50.901959531), (74.6969999642, 52.3161730933), (73.2827864019, 52.901959531))
            Line((73.2827864019, 52.901959531), (75.2827864019, 52.901959531))
            Line((75.2827864019, 52.901959531), (75.2827864019, 50.901959531))
        make_face()
    extrude(amount=F5_T1_DEPTH, mode=Mode.SUBTRACT)


with BuildPart() as f5_tool4:
    # F5_s5 → F5_t6 (new body)
    with BuildSketch(Plane.YZ.offset(73.2827864019)):
        with Locations((51.901959531, 4)):
            Rectangle(F5_S5_W, F5_S5_H)
    extrude(amount=F5_T6_DEPTH)

    # F5_s7 → F5_t8 (revolve, cut)
    with BuildSketch(Plane(origin=(73.2827864019, 50.901959531, 3), x_dir=(0, -0.7071067812, -0.7071067812), z_dir=(0, -0.7071067812, 0.7071067812))):
        with BuildLine():
            ThreePointArc((0, -2), (2, 0), (0, 2))
            Line((0, 2), (0, -2))
        make_face()
    revolve(axis=Axis((73.2827864019, 50.901959531, 3), (1, 0, 0)), mode=Mode.SUBTRACT)


with BuildPart() as f1_1:
    add(f1.part)

    # F5_t3: cut F5_tool4
    add(f5_tool4.part, mode=Mode.SUBTRACT)


with BuildPart() as f5_tool10:
    # F5_s11 → F5_t12 (new body)
    with BuildSketch(Plane.XZ.offset(63.098040469)):
        with Locations((74.2827864019, 4)):
            Rectangle(F5_S11_W, F5_S11_H)
    extrude(amount=F5_T12_DEPTH)

    # F5_s13 → F5_t14 (revolve, cut)
    with BuildSketch(Plane(origin=(73.2827864019, -63.098040469, 3), x_dir=(-0.7071067812, 0, -0.7071067812), z_dir=(-0.7071067812, 0, 0.7071067812))):
        with BuildLine():
            ThreePointArc((0, -2), (2, 0), (0, 2))
            Line((0, 2), (0, -2))
        make_face()
    revolve(axis=Axis((73.2827864019, -63.098040469, 3), (0, -1, 0)), mode=Mode.SUBTRACT)


with BuildPart() as f1_2:
    add(f1_1.part)

    # F5_t9: cut F5_tool10
    add(f5_tool10.part, mode=Mode.SUBTRACT)


with BuildPart() as f5_tool16:
    # F5_s17 → F5_t18 (new body)
    with BuildSketch(Plane.XZ.offset(63.098040469)):
        with Locations((-73.7172135981, 4)):
            Rectangle(F5_S17_W, F5_S17_H)
    extrude(amount=F5_T18_DEPTH)

    # F5_s19 → F5_t20 (revolve, cut)
    with BuildSketch(Plane(origin=(-72.7172135981, -63.098040469, 3), x_dir=(0.7071067812, 0, -0.7071067812), z_dir=(-0.7071067812, 0, -0.7071067812))):
        with BuildLine():
            ThreePointArc((0, -2), (2, 0), (0, 2))
            Line((0, 2), (0, -2))
        make_face()
    revolve(axis=Axis((-72.7172135981, -63.098040469, 3), (0, -1, 0)), mode=Mode.SUBTRACT)


with BuildPart() as f1_3:
    add(f1_2.part)

    # F5_t15: cut F5_tool16
    add(f5_tool16.part, mode=Mode.SUBTRACT)


with BuildPart() as f5_tool22:
    # F5_s23 → F5_t24 (new body)
    with BuildSketch(Plane.YZ.offset(-72.7172135981)):
        with Locations((51.901959531, 4)):
            Rectangle(F5_S23_W, F5_S23_H)
    extrude(amount=-F5_T24_DEPTH)

    # F5_s25 → F5_t26 (revolve, cut)
    with BuildSketch(Plane(origin=(-72.7172135981, 50.901959531, 3), x_dir=(0, -0.7071067812, -0.7071067812), z_dir=(0, 0.7071067812, -0.7071067812))):
        with BuildLine():
            ThreePointArc((0, -2), (2, 0), (0, 2))
            Line((0, 2), (0, -2))
        make_face()
    revolve(axis=Axis((-72.7172135981, 50.901959531, 3), (-1, 0, 0)), mode=Mode.SUBTRACT)


with BuildPart() as f1_4:
    add(f1_3.part)

    # F5_t21: cut F5_tool22
    add(f5_tool22.part, mode=Mode.SUBTRACT)


solid = f1_4.part
